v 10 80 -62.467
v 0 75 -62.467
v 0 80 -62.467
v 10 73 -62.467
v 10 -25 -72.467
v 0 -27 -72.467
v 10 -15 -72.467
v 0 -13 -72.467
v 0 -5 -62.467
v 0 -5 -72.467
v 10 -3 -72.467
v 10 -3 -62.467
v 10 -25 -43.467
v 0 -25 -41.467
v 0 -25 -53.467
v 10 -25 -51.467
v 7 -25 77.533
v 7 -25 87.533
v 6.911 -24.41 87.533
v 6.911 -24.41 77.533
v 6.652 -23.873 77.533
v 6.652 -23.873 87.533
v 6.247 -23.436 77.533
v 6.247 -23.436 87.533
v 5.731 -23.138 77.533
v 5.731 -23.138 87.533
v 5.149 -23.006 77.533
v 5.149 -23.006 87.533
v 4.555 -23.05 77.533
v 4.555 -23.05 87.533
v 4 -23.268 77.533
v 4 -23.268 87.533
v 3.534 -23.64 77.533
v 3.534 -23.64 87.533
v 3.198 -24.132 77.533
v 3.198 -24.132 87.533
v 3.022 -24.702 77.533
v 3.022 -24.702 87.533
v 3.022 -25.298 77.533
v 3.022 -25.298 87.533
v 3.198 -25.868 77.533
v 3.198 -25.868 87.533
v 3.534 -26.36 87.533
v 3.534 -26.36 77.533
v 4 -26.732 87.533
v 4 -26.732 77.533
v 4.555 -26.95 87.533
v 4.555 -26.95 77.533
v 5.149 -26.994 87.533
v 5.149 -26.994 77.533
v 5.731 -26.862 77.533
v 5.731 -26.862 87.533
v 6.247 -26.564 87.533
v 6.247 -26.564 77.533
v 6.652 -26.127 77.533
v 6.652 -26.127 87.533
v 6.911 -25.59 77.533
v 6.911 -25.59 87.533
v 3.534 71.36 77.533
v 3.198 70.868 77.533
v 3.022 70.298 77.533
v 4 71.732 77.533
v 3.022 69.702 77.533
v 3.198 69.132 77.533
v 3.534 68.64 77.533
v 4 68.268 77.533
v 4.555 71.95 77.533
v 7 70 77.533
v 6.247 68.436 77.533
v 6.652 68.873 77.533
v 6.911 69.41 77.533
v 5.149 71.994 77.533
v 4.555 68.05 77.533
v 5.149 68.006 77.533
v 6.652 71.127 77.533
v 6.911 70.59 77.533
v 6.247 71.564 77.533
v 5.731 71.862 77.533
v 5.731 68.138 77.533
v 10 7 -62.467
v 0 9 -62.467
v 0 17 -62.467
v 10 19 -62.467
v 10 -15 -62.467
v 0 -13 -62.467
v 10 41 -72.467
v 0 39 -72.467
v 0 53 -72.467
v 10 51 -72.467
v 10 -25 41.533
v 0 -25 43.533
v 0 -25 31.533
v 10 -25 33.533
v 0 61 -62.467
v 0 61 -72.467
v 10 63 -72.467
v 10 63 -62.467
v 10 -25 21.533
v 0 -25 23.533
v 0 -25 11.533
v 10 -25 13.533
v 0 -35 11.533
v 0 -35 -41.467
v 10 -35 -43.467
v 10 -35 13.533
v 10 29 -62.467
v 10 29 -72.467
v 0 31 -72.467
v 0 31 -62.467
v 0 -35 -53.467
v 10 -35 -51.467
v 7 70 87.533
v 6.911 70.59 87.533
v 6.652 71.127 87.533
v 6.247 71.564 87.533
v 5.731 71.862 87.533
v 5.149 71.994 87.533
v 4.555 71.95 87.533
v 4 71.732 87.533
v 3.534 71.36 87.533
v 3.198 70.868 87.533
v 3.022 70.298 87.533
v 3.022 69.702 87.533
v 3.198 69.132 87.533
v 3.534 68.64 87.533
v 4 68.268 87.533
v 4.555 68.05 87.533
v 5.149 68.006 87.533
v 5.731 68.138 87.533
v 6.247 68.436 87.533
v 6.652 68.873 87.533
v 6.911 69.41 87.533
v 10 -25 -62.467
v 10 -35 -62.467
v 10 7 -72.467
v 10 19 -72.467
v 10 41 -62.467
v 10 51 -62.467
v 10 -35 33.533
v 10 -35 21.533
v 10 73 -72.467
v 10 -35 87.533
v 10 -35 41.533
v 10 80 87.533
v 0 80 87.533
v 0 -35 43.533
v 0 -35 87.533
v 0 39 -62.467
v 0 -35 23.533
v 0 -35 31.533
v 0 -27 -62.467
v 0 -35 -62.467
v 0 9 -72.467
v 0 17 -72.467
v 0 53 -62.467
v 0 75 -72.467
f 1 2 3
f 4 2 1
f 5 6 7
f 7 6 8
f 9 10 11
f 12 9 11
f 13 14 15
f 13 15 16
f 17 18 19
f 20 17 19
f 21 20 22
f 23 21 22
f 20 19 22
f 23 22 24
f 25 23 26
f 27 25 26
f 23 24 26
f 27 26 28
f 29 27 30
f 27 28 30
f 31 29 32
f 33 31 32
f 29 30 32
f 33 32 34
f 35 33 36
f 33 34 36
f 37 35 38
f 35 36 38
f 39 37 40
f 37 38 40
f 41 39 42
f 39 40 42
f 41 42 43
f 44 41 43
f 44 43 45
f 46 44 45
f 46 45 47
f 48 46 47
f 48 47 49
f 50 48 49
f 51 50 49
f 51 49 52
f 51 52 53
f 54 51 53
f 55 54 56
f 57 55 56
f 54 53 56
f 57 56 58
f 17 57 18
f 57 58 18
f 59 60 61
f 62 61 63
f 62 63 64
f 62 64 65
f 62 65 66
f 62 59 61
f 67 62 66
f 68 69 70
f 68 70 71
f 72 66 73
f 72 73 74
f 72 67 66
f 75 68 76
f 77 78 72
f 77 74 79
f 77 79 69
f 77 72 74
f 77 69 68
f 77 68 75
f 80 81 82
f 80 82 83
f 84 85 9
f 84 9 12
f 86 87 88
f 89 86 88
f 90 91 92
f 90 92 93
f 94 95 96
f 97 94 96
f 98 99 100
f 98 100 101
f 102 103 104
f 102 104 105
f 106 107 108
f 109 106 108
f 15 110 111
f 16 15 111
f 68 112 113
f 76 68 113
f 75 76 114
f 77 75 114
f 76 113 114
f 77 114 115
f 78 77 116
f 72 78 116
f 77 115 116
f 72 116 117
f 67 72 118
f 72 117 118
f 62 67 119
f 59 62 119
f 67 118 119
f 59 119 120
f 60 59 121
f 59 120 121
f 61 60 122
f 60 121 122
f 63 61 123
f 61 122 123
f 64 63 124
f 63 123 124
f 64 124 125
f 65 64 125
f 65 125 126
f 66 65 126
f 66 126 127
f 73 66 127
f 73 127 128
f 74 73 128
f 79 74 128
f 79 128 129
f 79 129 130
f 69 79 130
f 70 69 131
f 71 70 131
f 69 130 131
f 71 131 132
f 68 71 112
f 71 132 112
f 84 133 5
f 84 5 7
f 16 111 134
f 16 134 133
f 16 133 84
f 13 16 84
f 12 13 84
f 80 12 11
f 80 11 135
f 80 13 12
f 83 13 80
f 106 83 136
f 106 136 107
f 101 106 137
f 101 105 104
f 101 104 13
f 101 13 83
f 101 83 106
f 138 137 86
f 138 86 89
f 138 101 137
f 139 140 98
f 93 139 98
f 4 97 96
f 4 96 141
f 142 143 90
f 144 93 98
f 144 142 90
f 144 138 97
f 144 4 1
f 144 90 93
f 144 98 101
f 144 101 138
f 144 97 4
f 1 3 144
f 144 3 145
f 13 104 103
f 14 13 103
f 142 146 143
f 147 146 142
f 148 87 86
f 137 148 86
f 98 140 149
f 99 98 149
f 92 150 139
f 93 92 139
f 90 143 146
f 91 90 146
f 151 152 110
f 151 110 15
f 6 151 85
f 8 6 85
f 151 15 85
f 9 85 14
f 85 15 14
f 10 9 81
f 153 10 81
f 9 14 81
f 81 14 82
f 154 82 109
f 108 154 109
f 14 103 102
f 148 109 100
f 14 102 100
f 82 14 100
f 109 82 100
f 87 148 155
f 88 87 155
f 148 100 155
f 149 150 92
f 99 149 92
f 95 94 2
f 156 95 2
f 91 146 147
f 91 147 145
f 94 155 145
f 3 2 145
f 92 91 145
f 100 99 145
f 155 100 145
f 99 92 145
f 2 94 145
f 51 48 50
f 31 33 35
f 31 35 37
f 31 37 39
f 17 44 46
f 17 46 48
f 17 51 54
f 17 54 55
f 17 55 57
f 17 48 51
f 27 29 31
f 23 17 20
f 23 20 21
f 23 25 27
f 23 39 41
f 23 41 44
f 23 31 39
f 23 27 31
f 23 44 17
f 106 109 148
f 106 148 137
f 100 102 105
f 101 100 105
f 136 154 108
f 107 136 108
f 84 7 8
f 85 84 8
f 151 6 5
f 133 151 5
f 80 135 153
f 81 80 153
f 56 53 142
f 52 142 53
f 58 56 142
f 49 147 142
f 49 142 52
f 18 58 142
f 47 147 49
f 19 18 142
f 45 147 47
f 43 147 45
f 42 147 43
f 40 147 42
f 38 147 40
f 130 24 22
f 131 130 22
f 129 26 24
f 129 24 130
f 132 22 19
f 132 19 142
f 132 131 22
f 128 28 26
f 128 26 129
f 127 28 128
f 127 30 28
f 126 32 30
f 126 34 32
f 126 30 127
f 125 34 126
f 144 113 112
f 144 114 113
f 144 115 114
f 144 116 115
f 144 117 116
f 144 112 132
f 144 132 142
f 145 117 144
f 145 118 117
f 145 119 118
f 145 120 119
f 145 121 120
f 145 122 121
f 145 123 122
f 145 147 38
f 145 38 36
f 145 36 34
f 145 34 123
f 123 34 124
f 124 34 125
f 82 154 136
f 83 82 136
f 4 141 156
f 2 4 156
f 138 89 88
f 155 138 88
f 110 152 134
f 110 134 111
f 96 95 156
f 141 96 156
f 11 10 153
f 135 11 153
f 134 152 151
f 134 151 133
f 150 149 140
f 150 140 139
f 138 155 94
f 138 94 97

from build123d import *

# Parameters (mm, degrees)
F0_W     = 115
F0_H     = 160
F1_DEPTH = 10
F3_DEPTH = 10
F5_DEPTH = 10
F6_R     = 2
F7_DEPTH = 10


with BuildPart() as f1:
    # F0 (on Right) → F1 (new body)
    with BuildSketch(Plane.YZ):
        with Locations((22.5, 7.532959)):
            Rectangle(F0_W, F0_H)
    extrude(amount=F1_DEPTH)

    # F2 (on face) → F3 (cut)
    with BuildSketch(Plane.XZ.offset(35)):
        Polygon((10, 41.532959), (0, 43.532959), (0, 31.532959), (10, 33.532959), align=None)
        Polygon((10, 21.532959), (0, 23.532959), (0, 11.532959), (10, 13.532959), align=None)
        Polygon((10, -43.467041), (0, -41.467041), (0, -53.467041), (10, -51.467041), align=None)
    extrude(amount=-F3_DEPTH, mode=Mode.SUBTRACT)

    # F4 (on face) → F5 (cut)
    with BuildSketch(Plane(origin=(0, 0, -72.467041), x_dir=(1, 0, 0), z_dir=(0, 0, -1))):
        Polygon((10, 37), (0, 35), (0, 27), (10, 25), align=None)
        Polygon((10, 3), (10, 15), (0, 13), (0, 5), align=None)
        Polygon((10, -19), (10, -7), (0, -9), (0, -17), align=None)
        Polygon((10, -41), (10, -29), (0, -31), (0, -39), align=None)
        Polygon((10, -63), (10, -51), (0, -53), (0, -61), align=None)
        Polygon((10, -85), (10, -73), (0, -75), (0, -83), align=None)
    extrude(amount=-F5_DEPTH, mode=Mode.SUBTRACT)

    # F6 (on face) → F7 (cut)
    with BuildSketch(Plane.XY.offset(87.532959)):
        with Locations((5, 70)):
            Circle(F6_R)
        with Locations((5, -25)):
            Circle(F6_R)
    extrude(amount=-F7_DEPTH, mode=Mode.SUBTRACT)


solid = f1.part
